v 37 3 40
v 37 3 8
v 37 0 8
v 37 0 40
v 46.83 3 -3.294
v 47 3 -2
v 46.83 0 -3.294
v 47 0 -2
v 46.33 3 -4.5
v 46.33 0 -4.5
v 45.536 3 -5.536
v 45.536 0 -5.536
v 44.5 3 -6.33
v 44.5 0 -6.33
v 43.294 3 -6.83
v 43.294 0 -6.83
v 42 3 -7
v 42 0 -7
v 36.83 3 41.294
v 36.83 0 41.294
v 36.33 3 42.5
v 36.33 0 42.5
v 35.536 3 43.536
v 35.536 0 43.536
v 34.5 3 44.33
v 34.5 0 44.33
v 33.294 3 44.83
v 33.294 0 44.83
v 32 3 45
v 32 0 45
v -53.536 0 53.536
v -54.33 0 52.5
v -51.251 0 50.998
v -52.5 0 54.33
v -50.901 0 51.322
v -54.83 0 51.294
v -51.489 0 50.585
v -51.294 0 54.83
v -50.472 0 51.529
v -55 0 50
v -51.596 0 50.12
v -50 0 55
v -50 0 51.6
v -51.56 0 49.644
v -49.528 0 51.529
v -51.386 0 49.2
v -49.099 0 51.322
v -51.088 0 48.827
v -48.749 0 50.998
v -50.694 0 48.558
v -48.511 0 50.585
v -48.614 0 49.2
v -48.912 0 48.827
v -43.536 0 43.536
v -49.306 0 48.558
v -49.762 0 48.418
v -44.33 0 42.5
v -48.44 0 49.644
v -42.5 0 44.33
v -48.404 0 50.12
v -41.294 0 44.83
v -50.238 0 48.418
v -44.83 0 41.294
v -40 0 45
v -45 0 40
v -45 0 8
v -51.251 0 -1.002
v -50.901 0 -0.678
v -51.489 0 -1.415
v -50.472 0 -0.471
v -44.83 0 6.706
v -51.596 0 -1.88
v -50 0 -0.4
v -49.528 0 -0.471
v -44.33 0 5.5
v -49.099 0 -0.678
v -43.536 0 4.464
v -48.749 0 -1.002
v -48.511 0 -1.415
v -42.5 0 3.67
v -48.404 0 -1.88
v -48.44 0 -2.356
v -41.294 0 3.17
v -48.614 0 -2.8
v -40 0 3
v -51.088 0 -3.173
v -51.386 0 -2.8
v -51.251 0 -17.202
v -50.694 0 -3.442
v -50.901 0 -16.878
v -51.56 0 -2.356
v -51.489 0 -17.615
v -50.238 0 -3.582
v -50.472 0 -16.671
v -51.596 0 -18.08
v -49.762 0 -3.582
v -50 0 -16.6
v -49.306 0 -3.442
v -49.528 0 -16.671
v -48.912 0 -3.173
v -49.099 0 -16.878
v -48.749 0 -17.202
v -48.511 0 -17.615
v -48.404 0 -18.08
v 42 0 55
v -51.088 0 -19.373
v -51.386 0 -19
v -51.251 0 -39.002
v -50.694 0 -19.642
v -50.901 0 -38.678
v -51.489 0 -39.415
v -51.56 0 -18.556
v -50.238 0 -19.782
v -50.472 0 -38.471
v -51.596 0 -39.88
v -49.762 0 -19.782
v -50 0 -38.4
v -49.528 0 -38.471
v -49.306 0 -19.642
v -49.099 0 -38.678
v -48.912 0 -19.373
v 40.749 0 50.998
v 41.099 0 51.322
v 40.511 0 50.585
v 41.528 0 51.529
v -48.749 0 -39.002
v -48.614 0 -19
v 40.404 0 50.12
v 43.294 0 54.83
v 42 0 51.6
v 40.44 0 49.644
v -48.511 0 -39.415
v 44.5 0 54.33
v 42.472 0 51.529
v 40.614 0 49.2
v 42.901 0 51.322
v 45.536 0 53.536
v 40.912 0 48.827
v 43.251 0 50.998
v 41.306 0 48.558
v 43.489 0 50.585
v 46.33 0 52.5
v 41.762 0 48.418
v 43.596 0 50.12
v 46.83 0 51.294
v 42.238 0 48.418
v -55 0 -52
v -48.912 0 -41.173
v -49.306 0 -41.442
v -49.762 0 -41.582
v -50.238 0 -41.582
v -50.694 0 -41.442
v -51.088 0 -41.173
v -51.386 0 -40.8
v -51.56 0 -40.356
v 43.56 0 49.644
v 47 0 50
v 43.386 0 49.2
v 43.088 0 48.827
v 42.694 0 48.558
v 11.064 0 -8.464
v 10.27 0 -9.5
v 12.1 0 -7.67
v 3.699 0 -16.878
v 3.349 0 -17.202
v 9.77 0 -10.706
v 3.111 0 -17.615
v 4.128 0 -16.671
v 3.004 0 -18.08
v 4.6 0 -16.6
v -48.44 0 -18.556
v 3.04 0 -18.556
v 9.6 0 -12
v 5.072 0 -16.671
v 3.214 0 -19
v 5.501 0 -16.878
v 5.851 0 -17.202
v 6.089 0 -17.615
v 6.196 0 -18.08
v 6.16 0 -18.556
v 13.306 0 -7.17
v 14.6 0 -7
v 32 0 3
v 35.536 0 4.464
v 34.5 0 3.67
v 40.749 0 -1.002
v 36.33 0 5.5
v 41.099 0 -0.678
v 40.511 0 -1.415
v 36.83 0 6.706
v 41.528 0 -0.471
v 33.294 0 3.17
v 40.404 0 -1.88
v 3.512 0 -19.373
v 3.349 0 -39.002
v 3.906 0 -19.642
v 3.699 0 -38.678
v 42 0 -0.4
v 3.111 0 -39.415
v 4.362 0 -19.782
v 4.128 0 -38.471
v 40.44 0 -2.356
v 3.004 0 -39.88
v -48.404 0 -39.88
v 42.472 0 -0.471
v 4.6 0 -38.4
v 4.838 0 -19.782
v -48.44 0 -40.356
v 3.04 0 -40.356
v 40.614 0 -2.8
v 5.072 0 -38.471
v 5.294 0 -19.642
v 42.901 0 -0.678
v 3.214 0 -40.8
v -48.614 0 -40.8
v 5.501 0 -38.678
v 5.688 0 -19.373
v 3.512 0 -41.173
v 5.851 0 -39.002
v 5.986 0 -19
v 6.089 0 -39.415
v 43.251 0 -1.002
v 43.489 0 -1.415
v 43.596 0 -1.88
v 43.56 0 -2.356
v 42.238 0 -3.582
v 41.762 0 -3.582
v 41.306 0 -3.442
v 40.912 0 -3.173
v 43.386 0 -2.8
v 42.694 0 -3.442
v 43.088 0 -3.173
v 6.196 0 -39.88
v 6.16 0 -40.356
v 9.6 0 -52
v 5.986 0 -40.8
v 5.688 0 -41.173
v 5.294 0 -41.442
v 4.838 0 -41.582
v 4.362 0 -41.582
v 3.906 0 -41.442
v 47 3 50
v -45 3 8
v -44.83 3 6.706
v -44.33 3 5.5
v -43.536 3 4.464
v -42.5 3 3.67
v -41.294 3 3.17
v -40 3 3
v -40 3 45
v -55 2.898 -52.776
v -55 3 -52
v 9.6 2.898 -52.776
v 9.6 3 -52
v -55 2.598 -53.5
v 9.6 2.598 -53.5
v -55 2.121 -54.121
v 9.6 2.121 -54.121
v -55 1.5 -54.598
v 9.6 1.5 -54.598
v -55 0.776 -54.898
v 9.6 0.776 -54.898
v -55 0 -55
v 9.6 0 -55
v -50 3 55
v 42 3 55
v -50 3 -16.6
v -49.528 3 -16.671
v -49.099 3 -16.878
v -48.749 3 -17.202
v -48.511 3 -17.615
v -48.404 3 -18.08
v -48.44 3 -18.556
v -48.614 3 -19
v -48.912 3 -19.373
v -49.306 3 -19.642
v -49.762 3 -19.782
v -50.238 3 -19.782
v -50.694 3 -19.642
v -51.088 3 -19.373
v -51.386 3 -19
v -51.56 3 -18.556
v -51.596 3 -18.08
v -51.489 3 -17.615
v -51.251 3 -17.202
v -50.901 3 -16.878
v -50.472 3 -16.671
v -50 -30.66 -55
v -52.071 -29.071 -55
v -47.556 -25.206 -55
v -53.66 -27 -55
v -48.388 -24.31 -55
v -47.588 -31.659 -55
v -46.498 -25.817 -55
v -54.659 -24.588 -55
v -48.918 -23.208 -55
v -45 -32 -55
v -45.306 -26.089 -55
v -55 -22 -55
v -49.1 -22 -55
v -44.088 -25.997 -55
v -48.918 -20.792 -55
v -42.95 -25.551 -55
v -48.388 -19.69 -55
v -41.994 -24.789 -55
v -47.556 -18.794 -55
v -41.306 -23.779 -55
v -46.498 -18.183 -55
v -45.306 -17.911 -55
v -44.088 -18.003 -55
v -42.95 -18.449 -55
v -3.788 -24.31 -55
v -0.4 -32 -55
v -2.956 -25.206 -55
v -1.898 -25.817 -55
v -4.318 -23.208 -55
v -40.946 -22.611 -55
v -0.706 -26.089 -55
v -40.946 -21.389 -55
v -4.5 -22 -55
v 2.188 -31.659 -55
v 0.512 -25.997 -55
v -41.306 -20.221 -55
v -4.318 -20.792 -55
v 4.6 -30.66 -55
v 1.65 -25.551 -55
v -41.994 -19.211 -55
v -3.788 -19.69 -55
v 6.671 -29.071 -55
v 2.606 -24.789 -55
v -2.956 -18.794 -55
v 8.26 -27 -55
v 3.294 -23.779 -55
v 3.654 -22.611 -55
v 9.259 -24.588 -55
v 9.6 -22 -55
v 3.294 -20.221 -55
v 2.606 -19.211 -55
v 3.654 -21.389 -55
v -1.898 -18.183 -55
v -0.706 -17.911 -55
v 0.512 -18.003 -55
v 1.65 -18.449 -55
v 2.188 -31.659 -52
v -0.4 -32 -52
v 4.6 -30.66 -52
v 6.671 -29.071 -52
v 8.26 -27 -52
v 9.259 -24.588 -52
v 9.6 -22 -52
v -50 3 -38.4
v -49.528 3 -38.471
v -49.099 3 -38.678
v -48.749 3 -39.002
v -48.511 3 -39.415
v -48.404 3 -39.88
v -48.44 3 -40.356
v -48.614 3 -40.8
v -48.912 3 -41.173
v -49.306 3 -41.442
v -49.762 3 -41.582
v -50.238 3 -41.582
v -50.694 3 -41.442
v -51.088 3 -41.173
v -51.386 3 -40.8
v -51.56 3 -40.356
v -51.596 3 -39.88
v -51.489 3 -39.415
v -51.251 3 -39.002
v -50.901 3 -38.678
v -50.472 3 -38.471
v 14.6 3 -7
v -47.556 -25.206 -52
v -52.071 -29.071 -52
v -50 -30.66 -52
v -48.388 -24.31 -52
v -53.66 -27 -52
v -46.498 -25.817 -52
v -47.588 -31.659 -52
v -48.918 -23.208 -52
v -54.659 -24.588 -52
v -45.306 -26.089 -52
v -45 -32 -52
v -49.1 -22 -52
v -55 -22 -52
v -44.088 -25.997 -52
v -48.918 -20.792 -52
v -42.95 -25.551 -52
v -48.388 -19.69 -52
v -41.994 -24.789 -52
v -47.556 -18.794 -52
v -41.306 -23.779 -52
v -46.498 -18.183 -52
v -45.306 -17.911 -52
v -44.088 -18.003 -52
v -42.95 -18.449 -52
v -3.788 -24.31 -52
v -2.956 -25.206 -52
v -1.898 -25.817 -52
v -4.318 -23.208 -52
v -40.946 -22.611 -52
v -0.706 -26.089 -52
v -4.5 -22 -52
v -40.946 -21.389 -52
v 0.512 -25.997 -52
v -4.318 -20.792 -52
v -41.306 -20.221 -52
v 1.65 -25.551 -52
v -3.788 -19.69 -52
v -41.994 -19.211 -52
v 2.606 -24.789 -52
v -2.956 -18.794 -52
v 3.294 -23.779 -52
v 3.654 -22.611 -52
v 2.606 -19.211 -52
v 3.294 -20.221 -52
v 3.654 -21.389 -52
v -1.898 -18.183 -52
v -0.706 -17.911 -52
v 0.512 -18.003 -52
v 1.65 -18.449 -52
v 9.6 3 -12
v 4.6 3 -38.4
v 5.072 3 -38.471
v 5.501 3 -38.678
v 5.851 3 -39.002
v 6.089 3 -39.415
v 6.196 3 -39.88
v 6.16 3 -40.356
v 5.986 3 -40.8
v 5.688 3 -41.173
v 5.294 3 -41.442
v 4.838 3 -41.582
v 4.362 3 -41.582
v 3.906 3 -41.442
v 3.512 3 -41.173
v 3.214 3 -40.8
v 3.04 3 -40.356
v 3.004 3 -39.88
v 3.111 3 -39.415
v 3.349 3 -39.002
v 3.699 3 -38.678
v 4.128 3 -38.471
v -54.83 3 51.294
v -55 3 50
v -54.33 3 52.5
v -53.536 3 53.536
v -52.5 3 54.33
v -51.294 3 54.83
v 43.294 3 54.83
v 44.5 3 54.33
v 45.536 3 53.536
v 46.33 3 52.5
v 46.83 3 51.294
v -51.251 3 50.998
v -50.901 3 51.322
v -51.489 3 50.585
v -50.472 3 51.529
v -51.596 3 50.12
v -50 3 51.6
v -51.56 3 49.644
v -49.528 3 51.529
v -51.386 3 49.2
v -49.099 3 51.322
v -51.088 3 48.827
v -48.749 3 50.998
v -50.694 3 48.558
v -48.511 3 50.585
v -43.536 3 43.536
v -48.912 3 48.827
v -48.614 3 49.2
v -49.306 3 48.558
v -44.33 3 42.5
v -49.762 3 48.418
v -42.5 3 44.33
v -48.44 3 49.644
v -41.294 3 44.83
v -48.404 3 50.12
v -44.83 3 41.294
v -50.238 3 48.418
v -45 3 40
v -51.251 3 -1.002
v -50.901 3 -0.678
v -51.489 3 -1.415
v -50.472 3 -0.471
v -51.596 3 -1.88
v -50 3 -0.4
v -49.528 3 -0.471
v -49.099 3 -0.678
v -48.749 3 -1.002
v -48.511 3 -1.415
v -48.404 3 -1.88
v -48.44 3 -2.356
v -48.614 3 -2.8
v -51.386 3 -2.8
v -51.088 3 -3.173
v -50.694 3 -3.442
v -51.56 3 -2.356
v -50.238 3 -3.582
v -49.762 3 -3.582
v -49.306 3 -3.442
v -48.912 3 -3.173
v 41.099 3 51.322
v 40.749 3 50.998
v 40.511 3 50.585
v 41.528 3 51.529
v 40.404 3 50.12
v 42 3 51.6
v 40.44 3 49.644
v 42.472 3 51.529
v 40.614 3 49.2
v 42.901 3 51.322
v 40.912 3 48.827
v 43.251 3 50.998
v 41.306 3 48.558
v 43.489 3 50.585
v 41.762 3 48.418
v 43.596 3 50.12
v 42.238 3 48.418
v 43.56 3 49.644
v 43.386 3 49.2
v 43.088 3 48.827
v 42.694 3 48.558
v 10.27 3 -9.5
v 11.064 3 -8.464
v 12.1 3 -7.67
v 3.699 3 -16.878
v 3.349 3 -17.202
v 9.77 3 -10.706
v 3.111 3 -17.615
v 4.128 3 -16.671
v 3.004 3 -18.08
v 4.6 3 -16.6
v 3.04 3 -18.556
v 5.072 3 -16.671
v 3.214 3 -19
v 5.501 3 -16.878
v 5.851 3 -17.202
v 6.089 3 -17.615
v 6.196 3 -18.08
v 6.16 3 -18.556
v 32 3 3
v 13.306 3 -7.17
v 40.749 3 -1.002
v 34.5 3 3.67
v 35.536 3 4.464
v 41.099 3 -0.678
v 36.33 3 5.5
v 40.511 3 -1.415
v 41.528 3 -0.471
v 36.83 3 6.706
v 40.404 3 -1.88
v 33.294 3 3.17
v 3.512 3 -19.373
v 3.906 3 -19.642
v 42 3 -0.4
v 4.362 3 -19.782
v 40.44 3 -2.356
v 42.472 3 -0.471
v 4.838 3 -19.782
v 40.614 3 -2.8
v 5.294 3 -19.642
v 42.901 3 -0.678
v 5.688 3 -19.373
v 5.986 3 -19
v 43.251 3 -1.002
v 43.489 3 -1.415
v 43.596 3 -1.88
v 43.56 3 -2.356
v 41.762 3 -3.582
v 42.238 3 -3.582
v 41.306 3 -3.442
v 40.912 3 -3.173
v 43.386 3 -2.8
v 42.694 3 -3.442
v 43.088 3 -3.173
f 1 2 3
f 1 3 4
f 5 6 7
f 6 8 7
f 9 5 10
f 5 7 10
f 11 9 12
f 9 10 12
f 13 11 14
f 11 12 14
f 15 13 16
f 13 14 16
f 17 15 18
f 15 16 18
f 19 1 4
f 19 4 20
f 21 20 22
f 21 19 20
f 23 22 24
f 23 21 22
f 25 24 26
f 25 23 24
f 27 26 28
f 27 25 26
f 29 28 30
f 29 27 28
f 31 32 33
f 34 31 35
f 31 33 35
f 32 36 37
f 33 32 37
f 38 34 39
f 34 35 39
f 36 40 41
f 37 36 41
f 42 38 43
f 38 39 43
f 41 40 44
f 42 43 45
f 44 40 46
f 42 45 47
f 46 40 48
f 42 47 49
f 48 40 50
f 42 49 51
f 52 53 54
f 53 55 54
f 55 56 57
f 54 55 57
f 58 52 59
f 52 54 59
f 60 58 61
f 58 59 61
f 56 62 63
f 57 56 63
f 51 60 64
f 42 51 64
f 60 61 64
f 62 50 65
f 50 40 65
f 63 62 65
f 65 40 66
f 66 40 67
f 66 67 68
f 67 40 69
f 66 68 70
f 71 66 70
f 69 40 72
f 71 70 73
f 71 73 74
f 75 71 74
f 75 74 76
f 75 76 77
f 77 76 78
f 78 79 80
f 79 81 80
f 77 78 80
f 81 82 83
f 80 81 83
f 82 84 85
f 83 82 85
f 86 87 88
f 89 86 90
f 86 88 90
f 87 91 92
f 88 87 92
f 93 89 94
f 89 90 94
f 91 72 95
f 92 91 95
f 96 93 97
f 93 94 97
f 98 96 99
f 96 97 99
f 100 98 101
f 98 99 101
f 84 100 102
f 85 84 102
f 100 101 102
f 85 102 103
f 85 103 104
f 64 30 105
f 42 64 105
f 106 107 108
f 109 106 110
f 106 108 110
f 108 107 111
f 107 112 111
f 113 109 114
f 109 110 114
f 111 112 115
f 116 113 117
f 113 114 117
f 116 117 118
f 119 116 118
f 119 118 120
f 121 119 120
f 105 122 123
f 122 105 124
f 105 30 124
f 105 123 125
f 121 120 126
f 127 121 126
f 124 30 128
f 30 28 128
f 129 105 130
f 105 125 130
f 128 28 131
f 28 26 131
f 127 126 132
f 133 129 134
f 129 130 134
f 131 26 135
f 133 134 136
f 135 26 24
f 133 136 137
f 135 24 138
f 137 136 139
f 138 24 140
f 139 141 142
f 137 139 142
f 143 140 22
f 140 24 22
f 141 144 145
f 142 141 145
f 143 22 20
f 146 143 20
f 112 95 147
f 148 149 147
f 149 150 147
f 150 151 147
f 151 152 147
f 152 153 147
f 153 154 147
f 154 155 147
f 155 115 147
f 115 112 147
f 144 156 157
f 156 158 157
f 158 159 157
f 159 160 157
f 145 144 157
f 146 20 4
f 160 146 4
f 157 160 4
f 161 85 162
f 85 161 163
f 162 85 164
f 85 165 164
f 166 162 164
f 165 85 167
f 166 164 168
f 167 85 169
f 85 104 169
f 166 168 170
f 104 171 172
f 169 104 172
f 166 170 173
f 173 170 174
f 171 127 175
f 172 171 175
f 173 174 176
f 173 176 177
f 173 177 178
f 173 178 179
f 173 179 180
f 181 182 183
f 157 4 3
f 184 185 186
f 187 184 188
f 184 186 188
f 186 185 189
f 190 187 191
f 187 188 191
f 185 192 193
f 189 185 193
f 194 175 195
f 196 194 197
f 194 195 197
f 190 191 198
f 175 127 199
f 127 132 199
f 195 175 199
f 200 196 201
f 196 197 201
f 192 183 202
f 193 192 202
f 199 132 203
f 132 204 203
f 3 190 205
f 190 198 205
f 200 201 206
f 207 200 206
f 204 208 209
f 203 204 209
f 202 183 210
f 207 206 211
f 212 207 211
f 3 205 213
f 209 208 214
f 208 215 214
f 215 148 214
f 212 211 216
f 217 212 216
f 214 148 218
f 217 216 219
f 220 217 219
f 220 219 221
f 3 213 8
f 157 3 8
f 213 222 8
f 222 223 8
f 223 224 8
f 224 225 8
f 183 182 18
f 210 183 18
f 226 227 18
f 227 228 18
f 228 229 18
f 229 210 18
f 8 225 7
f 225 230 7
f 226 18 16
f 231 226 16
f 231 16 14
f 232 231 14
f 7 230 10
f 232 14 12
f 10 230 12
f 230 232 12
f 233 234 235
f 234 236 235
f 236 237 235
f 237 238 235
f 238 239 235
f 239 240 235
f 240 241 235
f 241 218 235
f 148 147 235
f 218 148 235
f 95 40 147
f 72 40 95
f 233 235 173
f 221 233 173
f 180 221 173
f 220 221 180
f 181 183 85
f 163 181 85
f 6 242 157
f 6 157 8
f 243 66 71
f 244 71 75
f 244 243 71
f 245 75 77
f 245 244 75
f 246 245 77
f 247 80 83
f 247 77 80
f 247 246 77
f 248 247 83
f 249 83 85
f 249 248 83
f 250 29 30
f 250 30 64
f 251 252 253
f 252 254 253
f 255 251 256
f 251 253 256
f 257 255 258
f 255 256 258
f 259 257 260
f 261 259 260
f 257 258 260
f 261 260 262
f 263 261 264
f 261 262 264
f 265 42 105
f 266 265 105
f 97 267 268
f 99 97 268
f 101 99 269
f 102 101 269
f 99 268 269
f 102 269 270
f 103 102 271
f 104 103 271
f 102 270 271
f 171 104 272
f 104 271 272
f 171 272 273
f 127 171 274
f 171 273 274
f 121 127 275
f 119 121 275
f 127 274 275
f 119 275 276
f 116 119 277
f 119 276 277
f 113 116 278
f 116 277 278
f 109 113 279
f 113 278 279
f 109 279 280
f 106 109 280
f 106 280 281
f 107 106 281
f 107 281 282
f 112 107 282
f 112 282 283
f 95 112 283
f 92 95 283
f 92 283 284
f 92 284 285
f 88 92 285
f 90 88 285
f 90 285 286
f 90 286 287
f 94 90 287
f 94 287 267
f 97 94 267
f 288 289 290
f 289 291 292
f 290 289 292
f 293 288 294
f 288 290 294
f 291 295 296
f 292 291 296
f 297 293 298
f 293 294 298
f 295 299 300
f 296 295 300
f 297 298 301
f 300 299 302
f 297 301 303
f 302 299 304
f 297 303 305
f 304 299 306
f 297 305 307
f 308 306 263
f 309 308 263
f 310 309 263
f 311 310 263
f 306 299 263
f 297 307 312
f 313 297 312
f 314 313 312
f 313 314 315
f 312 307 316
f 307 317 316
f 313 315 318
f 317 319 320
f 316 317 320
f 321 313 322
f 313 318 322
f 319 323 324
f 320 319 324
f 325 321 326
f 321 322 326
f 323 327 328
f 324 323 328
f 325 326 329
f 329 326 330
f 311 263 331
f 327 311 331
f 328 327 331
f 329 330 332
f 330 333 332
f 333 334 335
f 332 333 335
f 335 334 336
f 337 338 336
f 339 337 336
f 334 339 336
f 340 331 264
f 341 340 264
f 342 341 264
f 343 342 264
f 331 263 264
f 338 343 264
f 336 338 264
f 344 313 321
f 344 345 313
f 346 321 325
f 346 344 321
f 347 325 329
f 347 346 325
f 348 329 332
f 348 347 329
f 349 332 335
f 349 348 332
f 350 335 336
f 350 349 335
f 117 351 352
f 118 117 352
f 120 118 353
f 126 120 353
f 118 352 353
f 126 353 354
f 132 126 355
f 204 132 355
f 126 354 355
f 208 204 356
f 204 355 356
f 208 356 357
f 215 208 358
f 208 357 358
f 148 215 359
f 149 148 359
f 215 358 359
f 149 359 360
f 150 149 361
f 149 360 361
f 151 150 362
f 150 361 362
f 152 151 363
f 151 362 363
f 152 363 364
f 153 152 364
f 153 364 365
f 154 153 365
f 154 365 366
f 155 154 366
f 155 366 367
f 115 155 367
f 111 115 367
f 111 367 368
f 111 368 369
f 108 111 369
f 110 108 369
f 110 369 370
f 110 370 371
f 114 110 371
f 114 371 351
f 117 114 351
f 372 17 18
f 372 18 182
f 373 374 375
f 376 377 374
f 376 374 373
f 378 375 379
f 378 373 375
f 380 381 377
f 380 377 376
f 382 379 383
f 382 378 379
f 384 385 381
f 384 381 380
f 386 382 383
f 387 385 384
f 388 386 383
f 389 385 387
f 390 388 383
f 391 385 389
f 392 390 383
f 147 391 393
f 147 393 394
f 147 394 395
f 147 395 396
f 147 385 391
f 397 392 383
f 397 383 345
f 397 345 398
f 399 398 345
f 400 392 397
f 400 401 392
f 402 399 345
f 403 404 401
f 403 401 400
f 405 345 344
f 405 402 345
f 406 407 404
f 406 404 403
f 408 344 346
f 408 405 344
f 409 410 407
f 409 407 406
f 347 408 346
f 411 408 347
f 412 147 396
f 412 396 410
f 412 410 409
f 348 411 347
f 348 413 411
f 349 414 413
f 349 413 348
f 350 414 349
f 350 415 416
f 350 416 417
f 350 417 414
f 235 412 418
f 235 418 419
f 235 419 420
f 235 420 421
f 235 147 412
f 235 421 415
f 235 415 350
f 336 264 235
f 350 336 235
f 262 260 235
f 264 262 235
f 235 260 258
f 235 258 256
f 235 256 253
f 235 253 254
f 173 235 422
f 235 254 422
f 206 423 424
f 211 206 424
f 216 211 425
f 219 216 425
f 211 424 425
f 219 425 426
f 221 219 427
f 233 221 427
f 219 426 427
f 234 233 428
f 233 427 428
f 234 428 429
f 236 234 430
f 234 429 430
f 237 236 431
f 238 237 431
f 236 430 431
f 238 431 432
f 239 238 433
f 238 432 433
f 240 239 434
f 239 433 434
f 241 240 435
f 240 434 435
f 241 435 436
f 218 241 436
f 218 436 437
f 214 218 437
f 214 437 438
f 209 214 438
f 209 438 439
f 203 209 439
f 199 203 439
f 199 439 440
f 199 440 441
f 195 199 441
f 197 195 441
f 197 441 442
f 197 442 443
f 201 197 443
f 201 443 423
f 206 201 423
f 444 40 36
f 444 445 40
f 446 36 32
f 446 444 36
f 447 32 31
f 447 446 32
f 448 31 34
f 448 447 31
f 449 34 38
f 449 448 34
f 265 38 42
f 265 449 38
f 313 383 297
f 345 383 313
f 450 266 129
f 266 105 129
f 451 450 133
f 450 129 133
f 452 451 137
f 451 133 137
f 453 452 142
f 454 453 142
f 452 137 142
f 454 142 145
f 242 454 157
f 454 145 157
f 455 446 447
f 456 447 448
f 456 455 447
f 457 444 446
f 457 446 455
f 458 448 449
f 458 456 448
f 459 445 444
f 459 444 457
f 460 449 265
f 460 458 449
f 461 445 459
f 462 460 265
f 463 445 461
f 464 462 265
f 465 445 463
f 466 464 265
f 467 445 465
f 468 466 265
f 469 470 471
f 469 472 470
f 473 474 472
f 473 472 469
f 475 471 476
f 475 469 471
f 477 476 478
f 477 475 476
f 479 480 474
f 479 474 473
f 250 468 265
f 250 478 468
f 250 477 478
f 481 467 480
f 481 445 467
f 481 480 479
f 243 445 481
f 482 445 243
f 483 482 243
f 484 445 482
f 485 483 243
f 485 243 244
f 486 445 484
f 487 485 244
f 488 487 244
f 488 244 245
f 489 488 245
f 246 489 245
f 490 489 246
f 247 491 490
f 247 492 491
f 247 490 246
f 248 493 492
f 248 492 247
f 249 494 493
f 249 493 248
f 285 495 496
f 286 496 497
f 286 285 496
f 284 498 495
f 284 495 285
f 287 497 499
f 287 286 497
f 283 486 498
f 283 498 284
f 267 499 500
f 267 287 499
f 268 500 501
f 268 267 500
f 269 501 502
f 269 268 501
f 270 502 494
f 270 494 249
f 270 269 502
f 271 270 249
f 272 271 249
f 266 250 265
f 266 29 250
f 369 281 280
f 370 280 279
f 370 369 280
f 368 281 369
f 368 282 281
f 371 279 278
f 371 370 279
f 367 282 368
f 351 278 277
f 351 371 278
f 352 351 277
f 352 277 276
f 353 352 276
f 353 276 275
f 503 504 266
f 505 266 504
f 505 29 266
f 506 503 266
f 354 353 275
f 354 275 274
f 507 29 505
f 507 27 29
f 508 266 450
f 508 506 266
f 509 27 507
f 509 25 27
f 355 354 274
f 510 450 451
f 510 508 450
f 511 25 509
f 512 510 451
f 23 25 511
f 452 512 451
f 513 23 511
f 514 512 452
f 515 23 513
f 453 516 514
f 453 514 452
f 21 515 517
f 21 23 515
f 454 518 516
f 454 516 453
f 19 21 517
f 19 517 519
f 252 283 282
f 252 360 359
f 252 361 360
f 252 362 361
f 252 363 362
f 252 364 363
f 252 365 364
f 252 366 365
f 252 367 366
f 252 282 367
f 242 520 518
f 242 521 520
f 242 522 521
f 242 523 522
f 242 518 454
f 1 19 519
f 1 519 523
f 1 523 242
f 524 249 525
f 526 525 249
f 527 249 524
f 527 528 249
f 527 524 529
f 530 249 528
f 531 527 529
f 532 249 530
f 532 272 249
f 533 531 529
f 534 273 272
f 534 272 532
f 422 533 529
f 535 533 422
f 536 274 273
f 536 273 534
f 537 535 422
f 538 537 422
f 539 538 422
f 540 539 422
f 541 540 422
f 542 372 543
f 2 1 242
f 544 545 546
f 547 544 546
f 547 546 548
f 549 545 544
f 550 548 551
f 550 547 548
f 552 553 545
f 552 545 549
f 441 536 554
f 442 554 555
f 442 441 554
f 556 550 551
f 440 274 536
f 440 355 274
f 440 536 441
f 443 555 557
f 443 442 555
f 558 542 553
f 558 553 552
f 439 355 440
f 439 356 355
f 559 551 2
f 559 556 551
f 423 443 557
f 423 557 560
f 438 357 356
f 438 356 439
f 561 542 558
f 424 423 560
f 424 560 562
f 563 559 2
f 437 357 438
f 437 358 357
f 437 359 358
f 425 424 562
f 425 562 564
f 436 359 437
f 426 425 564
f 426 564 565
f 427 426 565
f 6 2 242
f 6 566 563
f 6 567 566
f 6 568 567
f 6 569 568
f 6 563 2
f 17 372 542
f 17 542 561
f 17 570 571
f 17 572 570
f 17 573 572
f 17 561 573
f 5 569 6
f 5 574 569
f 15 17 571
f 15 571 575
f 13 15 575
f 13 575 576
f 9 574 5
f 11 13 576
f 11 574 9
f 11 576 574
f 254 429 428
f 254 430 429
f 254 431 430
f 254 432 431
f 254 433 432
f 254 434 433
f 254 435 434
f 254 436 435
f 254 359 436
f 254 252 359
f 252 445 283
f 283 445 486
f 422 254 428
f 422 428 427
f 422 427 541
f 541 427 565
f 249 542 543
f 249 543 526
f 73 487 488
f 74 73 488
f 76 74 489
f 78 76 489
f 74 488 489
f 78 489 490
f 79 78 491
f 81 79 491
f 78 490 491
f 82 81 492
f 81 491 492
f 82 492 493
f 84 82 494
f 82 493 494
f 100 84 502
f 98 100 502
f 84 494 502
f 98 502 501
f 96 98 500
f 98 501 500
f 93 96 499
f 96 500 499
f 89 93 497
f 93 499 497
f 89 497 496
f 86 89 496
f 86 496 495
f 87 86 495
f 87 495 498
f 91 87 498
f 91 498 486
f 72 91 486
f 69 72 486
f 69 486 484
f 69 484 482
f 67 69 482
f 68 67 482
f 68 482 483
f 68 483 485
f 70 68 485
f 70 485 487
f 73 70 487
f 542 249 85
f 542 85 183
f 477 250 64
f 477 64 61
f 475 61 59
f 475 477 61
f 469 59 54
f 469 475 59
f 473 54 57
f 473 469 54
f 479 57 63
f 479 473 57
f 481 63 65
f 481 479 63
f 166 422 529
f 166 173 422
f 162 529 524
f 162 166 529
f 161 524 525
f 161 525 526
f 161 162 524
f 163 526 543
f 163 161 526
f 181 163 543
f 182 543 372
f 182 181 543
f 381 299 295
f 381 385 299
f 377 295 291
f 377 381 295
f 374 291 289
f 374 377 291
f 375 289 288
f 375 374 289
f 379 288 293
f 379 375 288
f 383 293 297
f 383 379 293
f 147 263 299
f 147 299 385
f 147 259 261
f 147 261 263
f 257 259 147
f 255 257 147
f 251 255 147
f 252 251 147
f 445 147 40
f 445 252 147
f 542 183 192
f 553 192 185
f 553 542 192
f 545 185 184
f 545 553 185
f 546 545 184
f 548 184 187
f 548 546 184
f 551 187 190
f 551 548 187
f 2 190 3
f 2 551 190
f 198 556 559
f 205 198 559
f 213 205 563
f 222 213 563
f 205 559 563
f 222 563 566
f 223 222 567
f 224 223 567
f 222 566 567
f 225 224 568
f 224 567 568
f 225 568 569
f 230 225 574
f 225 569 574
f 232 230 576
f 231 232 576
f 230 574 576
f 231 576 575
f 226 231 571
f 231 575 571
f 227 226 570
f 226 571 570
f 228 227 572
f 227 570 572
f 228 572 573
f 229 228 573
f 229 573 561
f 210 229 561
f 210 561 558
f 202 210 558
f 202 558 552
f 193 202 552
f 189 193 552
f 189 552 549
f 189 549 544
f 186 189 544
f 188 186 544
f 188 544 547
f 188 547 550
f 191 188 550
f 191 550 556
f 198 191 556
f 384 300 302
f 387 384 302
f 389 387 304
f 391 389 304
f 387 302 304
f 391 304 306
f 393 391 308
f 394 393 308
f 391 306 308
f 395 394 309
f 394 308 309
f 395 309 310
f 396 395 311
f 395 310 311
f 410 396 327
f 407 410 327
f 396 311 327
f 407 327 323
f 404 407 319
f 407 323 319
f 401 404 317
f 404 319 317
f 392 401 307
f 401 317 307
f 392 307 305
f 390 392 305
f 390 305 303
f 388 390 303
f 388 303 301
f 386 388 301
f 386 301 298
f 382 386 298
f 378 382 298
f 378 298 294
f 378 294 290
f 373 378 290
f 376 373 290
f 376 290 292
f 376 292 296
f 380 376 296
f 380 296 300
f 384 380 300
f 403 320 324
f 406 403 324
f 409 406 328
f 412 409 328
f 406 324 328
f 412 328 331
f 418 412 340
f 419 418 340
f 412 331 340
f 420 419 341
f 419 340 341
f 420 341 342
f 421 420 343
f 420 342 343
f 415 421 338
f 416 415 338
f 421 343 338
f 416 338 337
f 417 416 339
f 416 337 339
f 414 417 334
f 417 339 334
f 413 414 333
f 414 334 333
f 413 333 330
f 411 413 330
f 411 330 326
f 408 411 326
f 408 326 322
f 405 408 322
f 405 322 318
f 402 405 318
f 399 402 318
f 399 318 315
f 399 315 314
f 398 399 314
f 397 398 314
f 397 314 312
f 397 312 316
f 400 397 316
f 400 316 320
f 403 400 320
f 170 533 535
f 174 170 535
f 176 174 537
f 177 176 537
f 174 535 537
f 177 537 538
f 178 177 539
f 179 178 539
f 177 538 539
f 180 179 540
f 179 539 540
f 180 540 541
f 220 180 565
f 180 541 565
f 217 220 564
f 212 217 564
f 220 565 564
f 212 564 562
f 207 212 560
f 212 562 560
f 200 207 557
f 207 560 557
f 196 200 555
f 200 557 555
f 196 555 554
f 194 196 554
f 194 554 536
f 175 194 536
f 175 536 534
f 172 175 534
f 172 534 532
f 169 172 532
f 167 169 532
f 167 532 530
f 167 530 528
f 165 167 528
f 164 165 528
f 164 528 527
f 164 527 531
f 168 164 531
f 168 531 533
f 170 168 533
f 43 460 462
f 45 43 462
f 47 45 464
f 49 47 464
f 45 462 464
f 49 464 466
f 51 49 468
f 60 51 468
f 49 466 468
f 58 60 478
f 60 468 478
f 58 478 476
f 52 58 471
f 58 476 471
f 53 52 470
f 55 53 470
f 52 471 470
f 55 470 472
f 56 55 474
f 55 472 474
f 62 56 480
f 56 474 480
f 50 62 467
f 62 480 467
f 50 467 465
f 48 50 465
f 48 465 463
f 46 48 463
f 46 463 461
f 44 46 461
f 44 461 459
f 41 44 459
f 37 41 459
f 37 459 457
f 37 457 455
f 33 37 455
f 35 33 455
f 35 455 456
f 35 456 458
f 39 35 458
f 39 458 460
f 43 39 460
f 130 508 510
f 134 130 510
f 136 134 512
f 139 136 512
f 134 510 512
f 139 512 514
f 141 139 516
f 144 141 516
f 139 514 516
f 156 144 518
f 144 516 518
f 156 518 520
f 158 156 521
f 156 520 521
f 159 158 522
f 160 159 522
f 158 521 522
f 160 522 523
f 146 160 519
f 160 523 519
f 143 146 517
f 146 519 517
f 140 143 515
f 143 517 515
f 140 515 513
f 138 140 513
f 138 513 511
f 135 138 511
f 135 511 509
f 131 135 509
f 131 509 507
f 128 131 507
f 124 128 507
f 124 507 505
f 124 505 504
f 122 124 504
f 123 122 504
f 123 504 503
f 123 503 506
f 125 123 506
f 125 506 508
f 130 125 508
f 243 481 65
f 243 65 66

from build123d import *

# Parameters (mm, degrees)
SKETCH_1_W          = 110
SKETCH_1_H          = 110
EXTRUDE_1_DEPTH     = 3
CUT_EXTRUDE_1_REACH = 79.84
SKETCH_2_R          = 1.6
CUT_EXTRUDE_2_REACH = 79.84
SKETCH_5_W          = 64.6
SKETCH_5_H          = 3
EXTRUDE_2_DEPTH     = 32
CUT_EXTRUDE_3_REACH = 129.079
SKETCH_6_R          = 4.1
CUT_EXTRUDE_4_REACH = 87.294
FILLET_1_R          = 5
FILLET_2_R          = 3
FILLET_3_R          = 10


with BuildPart() as part:
    # 草图1 → 凸台-拉伸1 (new body)
    with BuildSketch(Plane(origin=(0, 0, 0), x_dir=(1, 0, 0), z_dir=(0, 1, 0))):
        Rectangle(SKETCH_1_W, SKETCH_1_H)
    extrude(amount=EXTRUDE_1_DEPTH)

    # 草图2 → 切除-拉伸1 (cut, up to next)
    with BuildSketch(Plane(origin=(0, 3, 0), x_dir=(1, 0, 0), z_dir=(0, 1, 0)), mode=Mode.PRIVATE) as cut_extrude_1_sk1:
        with Locations(Location((-50, 40, 0), (0, 0, 270))):
            Circle(SKETCH_2_R)
    cut_extrude_1_tool1 = extrude(cut_extrude_1_sk1.sketch, amount=-CUT_EXTRUDE_1_REACH, mode=Mode.PRIVATE) & part.part
    # 草图2 → 切除-拉伸1 (cut, up to next)
    with BuildSketch(Plane(origin=(0, 3, 0), x_dir=(1, 0, 0), z_dir=(0, 1, 0)), mode=Mode.PRIVATE) as cut_extrude_1_sk2:
        with Locations(Location((4.6, 40, 0), (0, 0, 270))):
            Circle(SKETCH_2_R)
    cut_extrude_1_tool2 = extrude(cut_extrude_1_sk2.sketch, amount=-CUT_EXTRUDE_1_REACH, mode=Mode.PRIVATE) & part.part
    # 草图2 → 切除-拉伸1 (cut, up to next)
    with BuildSketch(Plane(origin=(0, 3, 0), x_dir=(1, 0, 0), z_dir=(0, 1, 0)), mode=Mode.PRIVATE) as cut_extrude_1_sk3:
        with Locations(Location((4.6, 18.2, 0), (0, 0, 270))):
            Circle(SKETCH_2_R)
    cut_extrude_1_tool3 = extrude(cut_extrude_1_sk3.sketch, amount=-CUT_EXTRUDE_1_REACH, mode=Mode.PRIVATE) & part.part
    # 草图2 → 切除-拉伸1 (cut, up to next)
    with BuildSketch(Plane(origin=(0, 3, 0), x_dir=(1, 0, 0), z_dir=(0, 1, 0)), mode=Mode.PRIVATE) as cut_extrude_1_sk4:
        with Locations(Location((-50, 18.2, 0), (0, 0, 270))):
            Circle(SKETCH_2_R)
    cut_extrude_1_tool4 = extrude(cut_extrude_1_sk4.sketch, amount=-CUT_EXTRUDE_1_REACH, mode=Mode.PRIVATE) & part.part
    # 草图2 → 切除-拉伸1 (cut, up to next)
    with BuildSketch(Plane(origin=(0, 3, 0), x_dir=(1, 0, 0), z_dir=(0, 1, 0)), mode=Mode.PRIVATE) as cut_extrude_1_sk5:
        with Locations(Location((-50, -50, 0), (0, 0, 270))):
            Circle(SKETCH_2_R)
    cut_extrude_1_tool5 = extrude(cut_extrude_1_sk5.sketch, amount=-CUT_EXTRUDE_1_REACH, mode=Mode.PRIVATE) & part.part
    # 草图2 → 切除-拉伸1 (cut, up to next)
    with BuildSketch(Plane(origin=(0, 3, 0), x_dir=(1, 0, 0), z_dir=(0, 1, 0)), mode=Mode.PRIVATE) as cut_extrude_1_sk6:
        with Locations(Location((42, -50, 0), (0, 0, 270))):
            Circle(SKETCH_2_R)
    cut_extrude_1_tool6 = extrude(cut_extrude_1_sk6.sketch, amount=-CUT_EXTRUDE_1_REACH, mode=Mode.PRIVATE) & part.part
    # 草图2 → 切除-拉伸1 (cut, up to next)
    with BuildSketch(Plane(origin=(0, 3, 0), x_dir=(1, 0, 0), z_dir=(0, 1, 0)), mode=Mode.PRIVATE) as cut_extrude_1_sk7:
        with Locations(Location((42, 2, 0), (0, 0, 270))):
            Circle(SKETCH_2_R)
    cut_extrude_1_tool7 = extrude(cut_extrude_1_sk7.sketch, amount=-CUT_EXTRUDE_1_REACH, mode=Mode.PRIVATE) & part.part
    # 草图2 → 切除-拉伸1 (cut, up to next)
    with BuildSketch(Plane(origin=(0, 3, 0), x_dir=(1, 0, 0), z_dir=(0, 1, 0)), mode=Mode.PRIVATE) as cut_extrude_1_sk8:
        with Locations(Location((-50, 2, 0), (0, 0, 270))):
            Circle(SKETCH_2_R)
    cut_extrude_1_tool8 = extrude(cut_extrude_1_sk8.sketch, amount=-CUT_EXTRUDE_1_REACH, mode=Mode.PRIVATE) & part.part
    add(cut_extrude_1_tool1.solids().sort_by_distance((-50, 3, -40))[0], mode=Mode.SUBTRACT)
    add(cut_extrude_1_tool2.solids().sort_by_distance((4.6, 3, -40))[0], mode=Mode.SUBTRACT)
    add(cut_extrude_1_tool3.solids().sort_by_distance((4.6, 3, -18.2))[0], mode=Mode.SUBTRACT)
    add(cut_extrude_1_tool4.solids().sort_by_distance((-50, 3, -18.2))[0], mode=Mode.SUBTRACT)
    add(cut_extrude_1_tool5.solids().sort_by_distance((-50, 3, 50))[0], mode=Mode.SUBTRACT)
    add(cut_extrude_1_tool6.solids().sort_by_distance((42, 3, 50))[0], mode=Mode.SUBTRACT)
    add(cut_extrude_1_tool7.solids().sort_by_distance((42, 3, -2))[0], mode=Mode.SUBTRACT)
    add(cut_extrude_1_tool8.solids().sort_by_distance((-50, 3, -2))[0], mode=Mode.SUBTRACT)

    # 草图3 → 切除-拉伸2 (cut, up to next)
    with BuildSketch(Plane(origin=(0, 3, 0), x_dir=(1, 0, 0), z_dir=(0, 1, 0)), mode=Mode.PRIVATE) as cut_extrude_2_sk1:
        Polygon((55, 17), (55, -55), (47, -55), (47, 7), (9.6, 7), (9.6, 55), (55, 55), align=None)
    cut_extrude_2_tool1 = extrude(cut_extrude_2_sk1.sketch, amount=-CUT_EXTRUDE_2_REACH, mode=Mode.PRIVATE) & part.part
    add(cut_extrude_2_tool1.solids().sort_by_distance((35.767105, 3, -20.802632))[0], mode=Mode.SUBTRACT)

    # 草图5 → 凸台-拉伸2 (add)
    with BuildSketch(Plane.XZ):
        with Locations((-22.7, -53.5)):
            Rectangle(SKETCH_5_W, SKETCH_5_H)
    extrude(amount=EXTRUDE_2_DEPTH)

    # 草图6 → 切除-拉伸3 (cut, up to next)
    with BuildSketch(Plane(origin=(0, 0, -55), x_dir=(-1, 0, 0), z_dir=(0, 0, -1)), mode=Mode.PRIVATE) as cut_extrude_3_sk1:
        with Locations((0.4, -22)):
            Circle(SKETCH_6_R)
    cut_extrude_3_tool1 = extrude(cut_extrude_3_sk1.sketch, amount=-CUT_EXTRUDE_3_REACH, mode=Mode.PRIVATE) & part.part
    # 草图6 → 切除-拉伸3 (cut, up to next)
    with BuildSketch(Plane(origin=(0, 0, -55), x_dir=(-1, 0, 0), z_dir=(0, 0, -1)), mode=Mode.PRIVATE) as cut_extrude_3_sk2:
        with Locations((45, -22)):
            Circle(SKETCH_6_R)
    cut_extrude_3_tool2 = extrude(cut_extrude_3_sk2.sketch, amount=-CUT_EXTRUDE_3_REACH, mode=Mode.PRIVATE) & part.part
    add(cut_extrude_3_tool1.solids().sort_by_distance((-0.4, -22, -55))[0], mode=Mode.SUBTRACT)
    add(cut_extrude_3_tool2.solids().sort_by_distance((-45, -22, -55))[0], mode=Mode.SUBTRACT)

    # 草图7 → 切除-拉伸4 (cut, up to next)
    with BuildSketch(Plane(origin=(0, 3, 0), x_dir=(1, 0, 0), z_dir=(0, 1, 0)), mode=Mode.PRIVATE) as cut_extrude_4_sk1:
        with BuildLine():
            Line((-40, -3), (32, -3))
            ThreePointArc((32, -3), (35.535533906, -4.464466094), (37, -8))
            Line((37, -8), (37, -40))
            ThreePointArc((37, -40), (35.535533906, -43.535533906), (32, -45))
            Line((32, -45), (-40, -45))
            ThreePointArc((-40, -45), (-43.535533906, -43.535533906), (-45, -40))
            Line((-45, -40), (-45, -8))
            ThreePointArc((-45, -8), (-43.535533906, -4.464466094), (-40, -3))
        make_face()
    cut_extrude_4_tool1 = extrude(cut_extrude_4_sk1.sketch, amount=-CUT_EXTRUDE_4_REACH, mode=Mode.PRIVATE) & part.part
    add(cut_extrude_4_tool1.solids().sort_by_distance((-4, 3, 24))[0], mode=Mode.SUBTRACT)

    # 圆角1
    fillet_1_edges = [part.edges().sort_by_distance(p)[0] for p in [
        (47, 1.5, 55),
        (47, 1.5, -7),
        (9.6, 1.5, -7),
        (-55, 1.5, 55),
    ]]
    fillet(fillet_1_edges, radius=FILLET_1_R)

    # 圆角2
    fillet_2_edges = [part.edges().sort_by_distance(p)[0] for p in [
        (-22.7, 3, -55),
    ]]
    fillet(fillet_2_edges, radius=FILLET_2_R)

    # 圆角3
    fillet_3_edges = [part.edges().sort_by_distance(p)[0] for p in [
        (9.6, -32, -53.5),
        (-55, -32, -53.5),
    ]]
    fillet(fillet_3_edges, radius=FILLET_3_R)


solid = part.part
